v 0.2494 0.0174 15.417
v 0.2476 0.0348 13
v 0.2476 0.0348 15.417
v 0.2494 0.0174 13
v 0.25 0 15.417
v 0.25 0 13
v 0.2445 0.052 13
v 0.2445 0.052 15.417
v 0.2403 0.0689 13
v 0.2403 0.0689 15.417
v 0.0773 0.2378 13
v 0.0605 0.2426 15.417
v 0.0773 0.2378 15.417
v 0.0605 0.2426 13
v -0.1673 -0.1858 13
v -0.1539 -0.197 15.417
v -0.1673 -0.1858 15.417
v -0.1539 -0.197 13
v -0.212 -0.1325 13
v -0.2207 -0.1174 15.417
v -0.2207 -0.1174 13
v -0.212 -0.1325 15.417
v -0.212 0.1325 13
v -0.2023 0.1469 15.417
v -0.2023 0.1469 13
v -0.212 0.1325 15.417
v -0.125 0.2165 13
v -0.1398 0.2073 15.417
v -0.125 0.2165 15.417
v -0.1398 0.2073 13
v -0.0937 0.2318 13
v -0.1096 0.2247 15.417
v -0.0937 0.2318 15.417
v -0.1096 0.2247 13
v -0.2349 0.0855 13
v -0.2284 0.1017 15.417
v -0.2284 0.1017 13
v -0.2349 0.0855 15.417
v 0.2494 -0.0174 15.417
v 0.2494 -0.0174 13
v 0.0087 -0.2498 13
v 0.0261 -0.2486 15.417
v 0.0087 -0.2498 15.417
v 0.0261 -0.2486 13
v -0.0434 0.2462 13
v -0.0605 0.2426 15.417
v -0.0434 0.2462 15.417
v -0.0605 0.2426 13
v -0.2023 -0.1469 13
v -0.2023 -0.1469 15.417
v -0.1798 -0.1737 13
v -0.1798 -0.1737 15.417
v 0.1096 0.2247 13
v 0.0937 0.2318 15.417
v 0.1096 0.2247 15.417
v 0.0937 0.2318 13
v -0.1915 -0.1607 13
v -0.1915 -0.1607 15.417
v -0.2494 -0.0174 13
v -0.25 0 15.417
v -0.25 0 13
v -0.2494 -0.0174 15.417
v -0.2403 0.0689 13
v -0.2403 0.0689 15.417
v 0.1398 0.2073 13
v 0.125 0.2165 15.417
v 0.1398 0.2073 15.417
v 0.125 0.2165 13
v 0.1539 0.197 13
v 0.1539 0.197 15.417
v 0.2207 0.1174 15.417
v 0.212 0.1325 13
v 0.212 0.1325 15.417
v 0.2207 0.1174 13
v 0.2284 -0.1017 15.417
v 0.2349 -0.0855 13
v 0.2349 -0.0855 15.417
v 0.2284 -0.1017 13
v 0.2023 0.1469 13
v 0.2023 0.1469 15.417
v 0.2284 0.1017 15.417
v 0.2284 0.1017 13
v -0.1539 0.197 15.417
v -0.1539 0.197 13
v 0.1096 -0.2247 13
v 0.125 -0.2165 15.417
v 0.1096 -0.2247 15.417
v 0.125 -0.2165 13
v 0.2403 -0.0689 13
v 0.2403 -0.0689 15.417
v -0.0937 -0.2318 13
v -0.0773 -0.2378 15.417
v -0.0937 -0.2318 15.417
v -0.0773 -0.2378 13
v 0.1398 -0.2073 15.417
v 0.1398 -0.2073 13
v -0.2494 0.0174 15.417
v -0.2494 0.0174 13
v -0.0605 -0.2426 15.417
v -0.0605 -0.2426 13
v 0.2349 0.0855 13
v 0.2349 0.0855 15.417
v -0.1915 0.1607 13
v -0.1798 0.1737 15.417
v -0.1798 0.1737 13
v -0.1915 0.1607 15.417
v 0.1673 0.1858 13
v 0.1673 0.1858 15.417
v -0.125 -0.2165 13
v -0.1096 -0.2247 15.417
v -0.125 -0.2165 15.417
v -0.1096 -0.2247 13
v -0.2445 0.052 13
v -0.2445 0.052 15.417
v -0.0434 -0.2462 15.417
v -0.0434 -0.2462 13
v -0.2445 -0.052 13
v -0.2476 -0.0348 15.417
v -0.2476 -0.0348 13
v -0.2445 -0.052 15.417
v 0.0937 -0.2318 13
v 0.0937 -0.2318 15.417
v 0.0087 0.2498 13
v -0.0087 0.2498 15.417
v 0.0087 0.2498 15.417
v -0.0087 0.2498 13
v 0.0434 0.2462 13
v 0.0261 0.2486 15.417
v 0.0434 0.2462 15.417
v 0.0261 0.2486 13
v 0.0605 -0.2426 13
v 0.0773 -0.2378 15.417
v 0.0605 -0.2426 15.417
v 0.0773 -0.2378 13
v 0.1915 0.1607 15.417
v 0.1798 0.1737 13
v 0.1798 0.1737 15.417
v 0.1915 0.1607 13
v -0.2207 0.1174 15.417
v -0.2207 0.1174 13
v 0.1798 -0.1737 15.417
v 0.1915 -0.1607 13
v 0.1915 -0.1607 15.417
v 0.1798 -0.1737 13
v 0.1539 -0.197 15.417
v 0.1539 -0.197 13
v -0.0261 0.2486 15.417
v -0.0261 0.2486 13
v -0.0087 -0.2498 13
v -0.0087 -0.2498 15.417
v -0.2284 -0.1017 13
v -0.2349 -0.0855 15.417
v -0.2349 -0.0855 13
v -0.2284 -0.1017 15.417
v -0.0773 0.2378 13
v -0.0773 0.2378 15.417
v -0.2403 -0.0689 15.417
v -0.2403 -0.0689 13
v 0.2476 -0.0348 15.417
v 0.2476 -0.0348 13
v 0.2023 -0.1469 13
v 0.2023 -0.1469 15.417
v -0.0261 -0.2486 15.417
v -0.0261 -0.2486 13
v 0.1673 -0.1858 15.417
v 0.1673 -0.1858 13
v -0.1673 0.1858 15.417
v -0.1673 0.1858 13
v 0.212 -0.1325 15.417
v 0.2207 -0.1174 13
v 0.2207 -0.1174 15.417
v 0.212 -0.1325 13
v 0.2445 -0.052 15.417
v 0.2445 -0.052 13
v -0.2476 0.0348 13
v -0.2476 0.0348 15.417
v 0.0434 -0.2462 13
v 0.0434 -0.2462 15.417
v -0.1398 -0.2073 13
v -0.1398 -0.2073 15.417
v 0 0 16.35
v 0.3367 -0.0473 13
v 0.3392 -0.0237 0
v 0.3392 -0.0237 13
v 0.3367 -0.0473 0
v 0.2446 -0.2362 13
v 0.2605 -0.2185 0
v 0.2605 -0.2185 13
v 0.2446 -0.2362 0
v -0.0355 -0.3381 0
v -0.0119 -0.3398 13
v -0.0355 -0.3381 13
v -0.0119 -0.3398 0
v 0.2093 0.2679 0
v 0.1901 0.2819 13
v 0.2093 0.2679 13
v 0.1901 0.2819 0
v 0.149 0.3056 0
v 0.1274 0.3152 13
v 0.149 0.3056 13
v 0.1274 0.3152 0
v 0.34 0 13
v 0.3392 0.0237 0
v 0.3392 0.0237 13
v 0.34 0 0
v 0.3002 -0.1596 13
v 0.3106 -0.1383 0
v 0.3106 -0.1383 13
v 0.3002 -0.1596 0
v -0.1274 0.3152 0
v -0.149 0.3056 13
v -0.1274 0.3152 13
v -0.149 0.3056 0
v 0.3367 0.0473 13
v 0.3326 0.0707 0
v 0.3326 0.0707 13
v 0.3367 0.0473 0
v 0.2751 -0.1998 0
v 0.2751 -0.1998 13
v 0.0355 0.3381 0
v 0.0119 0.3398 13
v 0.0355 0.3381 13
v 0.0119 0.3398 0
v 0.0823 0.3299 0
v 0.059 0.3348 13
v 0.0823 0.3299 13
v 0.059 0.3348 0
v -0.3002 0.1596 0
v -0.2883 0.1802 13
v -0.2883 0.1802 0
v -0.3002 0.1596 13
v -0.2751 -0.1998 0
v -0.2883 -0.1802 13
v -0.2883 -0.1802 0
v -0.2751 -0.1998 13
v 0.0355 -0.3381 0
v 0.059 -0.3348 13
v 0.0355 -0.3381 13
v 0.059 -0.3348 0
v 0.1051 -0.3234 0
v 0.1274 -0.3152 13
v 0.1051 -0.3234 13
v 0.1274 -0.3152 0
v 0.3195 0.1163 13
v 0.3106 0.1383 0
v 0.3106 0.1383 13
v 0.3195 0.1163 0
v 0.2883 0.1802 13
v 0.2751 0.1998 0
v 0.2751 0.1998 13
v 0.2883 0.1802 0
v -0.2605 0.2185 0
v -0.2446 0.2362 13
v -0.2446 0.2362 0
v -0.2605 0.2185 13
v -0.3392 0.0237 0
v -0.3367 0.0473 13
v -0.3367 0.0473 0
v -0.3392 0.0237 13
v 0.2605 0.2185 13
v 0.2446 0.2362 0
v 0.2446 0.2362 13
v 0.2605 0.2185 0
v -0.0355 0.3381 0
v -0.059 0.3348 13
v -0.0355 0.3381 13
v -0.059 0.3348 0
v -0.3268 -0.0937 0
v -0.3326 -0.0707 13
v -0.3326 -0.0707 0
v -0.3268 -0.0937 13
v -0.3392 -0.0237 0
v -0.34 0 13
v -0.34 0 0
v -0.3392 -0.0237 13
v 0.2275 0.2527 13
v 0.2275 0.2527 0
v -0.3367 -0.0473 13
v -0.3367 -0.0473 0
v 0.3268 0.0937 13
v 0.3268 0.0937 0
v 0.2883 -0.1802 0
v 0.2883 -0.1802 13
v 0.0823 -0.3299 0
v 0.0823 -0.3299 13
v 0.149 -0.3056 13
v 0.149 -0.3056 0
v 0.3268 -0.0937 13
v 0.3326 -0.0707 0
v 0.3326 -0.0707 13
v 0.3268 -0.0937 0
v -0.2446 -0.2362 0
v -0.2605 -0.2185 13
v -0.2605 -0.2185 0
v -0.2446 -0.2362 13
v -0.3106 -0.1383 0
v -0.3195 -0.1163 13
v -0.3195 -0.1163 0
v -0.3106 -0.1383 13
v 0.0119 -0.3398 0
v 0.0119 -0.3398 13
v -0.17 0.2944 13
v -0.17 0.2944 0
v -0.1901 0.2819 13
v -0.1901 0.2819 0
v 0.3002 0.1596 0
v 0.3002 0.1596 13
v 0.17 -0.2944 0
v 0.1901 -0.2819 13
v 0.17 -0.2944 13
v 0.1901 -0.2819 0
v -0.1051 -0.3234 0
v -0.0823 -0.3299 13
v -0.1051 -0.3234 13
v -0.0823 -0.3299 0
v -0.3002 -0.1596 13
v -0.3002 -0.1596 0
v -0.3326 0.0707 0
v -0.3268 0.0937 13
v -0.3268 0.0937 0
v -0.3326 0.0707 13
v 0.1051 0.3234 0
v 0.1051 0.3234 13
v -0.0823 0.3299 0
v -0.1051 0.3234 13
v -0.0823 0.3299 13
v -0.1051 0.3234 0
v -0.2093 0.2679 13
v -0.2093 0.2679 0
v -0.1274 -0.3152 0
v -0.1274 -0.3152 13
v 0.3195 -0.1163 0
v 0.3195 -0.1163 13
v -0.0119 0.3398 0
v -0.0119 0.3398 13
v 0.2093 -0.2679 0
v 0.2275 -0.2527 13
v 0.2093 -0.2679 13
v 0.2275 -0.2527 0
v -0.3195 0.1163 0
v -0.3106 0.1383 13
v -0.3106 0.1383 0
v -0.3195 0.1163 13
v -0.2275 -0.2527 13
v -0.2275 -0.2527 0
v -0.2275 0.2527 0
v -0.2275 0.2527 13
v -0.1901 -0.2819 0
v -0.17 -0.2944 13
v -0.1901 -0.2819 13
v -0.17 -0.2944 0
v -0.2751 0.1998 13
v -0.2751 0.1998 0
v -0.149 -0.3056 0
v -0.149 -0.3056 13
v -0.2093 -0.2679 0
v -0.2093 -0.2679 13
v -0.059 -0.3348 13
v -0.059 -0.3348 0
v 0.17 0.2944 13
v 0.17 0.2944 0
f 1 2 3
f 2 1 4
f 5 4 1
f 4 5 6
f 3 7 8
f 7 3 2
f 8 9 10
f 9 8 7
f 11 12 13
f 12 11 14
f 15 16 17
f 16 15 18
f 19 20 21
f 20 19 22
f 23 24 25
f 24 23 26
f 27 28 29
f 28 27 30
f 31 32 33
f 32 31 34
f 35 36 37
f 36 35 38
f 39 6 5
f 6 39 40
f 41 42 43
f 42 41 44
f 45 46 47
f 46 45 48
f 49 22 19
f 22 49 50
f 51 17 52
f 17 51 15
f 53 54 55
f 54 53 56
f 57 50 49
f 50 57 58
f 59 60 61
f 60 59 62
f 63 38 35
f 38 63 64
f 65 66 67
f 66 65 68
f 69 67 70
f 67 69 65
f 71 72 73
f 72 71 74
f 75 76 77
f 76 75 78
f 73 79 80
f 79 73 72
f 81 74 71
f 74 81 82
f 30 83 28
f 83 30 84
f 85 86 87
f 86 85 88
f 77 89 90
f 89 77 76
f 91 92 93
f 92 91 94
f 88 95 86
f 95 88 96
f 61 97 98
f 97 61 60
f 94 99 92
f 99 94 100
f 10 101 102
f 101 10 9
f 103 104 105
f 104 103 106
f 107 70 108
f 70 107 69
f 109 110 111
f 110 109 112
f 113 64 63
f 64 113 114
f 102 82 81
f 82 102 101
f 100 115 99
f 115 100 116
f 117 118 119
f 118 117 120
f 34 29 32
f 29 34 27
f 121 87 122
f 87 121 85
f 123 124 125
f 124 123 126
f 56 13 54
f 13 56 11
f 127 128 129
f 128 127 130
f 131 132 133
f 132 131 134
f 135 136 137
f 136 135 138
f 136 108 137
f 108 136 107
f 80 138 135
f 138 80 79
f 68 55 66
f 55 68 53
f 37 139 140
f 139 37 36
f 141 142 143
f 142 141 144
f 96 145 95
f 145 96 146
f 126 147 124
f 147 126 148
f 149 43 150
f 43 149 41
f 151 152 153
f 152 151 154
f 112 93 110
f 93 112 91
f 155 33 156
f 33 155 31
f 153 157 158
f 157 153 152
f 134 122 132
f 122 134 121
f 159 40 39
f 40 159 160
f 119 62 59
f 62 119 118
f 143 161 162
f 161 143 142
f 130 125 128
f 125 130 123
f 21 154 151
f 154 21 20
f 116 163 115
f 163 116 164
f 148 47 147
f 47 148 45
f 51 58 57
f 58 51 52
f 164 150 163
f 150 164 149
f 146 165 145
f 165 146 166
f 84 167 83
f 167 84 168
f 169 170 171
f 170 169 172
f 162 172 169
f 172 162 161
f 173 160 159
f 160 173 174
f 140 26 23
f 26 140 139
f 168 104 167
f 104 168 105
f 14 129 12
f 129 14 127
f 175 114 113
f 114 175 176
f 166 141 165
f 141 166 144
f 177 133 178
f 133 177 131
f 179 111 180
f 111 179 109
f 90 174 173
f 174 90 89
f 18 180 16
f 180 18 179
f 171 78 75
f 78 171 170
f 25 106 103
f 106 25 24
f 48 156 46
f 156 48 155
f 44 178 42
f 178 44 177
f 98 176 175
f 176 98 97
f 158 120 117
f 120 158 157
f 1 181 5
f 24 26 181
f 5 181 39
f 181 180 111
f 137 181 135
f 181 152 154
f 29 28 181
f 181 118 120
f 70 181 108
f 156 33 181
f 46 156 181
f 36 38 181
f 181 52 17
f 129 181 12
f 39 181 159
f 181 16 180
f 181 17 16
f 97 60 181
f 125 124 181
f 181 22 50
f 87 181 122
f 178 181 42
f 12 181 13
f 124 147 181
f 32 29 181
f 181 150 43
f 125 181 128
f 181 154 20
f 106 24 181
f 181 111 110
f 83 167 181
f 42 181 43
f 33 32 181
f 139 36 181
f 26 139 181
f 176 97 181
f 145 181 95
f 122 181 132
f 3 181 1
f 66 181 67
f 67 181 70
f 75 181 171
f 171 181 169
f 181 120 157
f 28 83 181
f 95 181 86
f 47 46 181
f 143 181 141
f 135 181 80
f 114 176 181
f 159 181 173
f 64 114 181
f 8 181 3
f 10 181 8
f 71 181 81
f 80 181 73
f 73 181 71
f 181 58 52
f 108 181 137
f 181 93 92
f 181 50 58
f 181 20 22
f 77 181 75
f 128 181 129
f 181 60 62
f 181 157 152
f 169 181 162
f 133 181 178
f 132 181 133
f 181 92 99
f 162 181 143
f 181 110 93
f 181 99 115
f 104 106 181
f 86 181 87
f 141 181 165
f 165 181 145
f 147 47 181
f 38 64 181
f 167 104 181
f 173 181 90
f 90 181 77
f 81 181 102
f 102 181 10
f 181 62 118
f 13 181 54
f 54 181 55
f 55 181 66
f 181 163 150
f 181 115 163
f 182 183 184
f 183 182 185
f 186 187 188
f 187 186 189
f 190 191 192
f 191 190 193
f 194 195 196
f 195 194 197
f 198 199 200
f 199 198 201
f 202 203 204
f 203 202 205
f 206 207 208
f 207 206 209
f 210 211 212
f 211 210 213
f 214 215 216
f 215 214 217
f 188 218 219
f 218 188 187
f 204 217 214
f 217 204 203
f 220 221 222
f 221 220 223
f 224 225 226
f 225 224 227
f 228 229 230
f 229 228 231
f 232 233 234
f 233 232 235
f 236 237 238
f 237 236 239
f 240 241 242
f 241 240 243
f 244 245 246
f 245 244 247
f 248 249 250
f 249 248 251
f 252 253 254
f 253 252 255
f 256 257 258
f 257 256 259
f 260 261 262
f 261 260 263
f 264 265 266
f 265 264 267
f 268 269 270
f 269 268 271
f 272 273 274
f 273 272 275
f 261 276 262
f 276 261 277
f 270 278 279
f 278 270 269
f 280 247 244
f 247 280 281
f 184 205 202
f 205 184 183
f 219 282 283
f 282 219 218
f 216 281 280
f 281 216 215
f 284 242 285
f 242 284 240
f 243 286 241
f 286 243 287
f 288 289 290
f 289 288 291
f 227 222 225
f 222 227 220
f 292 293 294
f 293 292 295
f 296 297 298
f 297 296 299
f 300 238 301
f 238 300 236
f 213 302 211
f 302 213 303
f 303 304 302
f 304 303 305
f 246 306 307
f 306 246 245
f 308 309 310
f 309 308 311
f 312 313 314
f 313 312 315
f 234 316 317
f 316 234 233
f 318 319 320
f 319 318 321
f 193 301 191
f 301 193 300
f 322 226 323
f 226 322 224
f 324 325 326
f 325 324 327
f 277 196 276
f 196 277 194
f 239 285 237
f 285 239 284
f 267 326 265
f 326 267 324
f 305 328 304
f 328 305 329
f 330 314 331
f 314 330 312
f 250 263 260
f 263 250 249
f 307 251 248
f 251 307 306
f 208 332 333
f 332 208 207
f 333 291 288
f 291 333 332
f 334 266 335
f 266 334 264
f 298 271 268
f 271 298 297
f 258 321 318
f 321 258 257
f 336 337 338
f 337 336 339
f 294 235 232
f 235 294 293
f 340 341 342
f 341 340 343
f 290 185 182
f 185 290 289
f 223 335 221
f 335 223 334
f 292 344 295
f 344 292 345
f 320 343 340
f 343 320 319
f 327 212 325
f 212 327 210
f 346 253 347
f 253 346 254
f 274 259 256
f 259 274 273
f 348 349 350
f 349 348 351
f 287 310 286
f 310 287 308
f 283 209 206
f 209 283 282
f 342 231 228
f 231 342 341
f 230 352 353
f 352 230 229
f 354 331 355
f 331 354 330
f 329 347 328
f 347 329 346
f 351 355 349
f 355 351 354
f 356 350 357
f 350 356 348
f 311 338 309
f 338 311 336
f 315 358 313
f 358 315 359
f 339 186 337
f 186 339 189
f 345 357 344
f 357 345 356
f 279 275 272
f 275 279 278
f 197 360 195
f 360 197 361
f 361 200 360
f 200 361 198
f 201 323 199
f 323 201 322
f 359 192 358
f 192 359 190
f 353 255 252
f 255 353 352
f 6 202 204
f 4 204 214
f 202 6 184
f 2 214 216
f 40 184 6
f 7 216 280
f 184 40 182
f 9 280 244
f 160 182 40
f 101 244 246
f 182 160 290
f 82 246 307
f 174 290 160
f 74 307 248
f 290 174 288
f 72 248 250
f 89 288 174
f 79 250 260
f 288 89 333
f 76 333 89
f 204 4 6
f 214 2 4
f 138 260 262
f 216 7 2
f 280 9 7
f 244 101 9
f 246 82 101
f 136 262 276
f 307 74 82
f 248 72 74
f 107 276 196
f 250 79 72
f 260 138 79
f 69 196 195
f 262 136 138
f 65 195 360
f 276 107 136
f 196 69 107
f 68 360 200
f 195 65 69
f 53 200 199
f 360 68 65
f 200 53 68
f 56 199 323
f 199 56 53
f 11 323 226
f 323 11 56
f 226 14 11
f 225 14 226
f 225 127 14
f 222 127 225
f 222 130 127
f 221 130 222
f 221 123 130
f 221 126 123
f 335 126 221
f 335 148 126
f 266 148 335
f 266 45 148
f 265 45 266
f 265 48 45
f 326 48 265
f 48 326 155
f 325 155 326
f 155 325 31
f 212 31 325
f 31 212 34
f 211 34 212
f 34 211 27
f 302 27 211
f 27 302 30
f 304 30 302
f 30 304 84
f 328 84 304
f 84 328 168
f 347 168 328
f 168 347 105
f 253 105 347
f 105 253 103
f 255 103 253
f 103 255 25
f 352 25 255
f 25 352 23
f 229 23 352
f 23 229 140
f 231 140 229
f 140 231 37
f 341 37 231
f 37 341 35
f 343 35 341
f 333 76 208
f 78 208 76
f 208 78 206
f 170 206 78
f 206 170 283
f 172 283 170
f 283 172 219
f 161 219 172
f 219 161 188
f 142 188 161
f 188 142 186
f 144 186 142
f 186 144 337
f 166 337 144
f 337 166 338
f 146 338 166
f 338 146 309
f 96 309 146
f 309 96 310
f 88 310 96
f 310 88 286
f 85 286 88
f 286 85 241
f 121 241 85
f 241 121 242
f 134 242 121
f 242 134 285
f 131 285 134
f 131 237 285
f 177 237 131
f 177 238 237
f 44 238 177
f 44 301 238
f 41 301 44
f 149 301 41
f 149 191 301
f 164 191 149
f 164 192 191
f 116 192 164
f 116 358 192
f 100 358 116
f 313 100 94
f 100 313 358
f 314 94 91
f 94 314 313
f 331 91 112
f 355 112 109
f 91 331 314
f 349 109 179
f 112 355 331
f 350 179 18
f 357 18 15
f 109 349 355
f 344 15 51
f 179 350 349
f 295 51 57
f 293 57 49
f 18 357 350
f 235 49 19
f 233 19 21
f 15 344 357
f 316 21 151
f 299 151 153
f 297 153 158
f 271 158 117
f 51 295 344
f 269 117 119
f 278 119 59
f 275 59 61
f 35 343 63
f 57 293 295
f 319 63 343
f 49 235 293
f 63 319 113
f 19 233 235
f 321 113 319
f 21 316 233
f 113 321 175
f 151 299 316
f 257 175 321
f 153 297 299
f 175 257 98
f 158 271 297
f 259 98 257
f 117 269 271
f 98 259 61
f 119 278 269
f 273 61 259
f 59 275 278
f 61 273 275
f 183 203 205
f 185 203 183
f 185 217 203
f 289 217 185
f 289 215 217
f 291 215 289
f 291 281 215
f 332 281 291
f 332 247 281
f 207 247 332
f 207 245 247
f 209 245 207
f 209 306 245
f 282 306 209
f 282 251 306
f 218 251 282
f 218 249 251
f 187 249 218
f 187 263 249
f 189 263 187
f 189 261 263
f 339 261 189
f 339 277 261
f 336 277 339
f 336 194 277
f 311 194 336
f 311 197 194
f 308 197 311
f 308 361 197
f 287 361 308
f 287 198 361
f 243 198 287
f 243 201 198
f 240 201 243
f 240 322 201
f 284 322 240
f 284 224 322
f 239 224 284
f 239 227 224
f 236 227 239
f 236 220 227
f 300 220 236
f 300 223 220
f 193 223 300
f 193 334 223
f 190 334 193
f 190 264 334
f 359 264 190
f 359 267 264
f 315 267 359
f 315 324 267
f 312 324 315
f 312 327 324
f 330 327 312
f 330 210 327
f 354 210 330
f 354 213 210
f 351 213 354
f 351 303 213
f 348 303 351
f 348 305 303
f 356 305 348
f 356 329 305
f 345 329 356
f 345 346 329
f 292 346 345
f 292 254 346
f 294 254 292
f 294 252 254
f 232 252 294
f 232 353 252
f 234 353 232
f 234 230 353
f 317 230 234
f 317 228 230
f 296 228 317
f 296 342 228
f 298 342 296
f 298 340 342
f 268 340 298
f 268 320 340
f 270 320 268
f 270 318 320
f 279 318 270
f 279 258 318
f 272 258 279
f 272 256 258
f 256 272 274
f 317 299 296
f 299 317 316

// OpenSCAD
$fn=90;

sleeve_len = 13;
sleeve_dia = 0.68;
pin_len    = 9.35;
pin_dia    = 0.5;
total_len  = 16.35;
tip_angle  = 30;
tip_len    = (pin_dia / 2) / tan(tip_angle / 2);

compressed = false;
stroke_len = compressed ? 2.65 : 0;

// Sleeve
color("Goldenrod")
    cylinder(h=sleeve_len, d=sleeve_dia);

// Pin
color("Silver")
translate([0, 0, total_len - stroke_len]) {
    translate([0, 0, -pin_len])
        cylinder(h=pin_len - tip_len, d=pin_dia);
    translate([0, 0, -tip_len])
        cylinder(h=tip_len, d1=pin_dia, d2=0);
}
